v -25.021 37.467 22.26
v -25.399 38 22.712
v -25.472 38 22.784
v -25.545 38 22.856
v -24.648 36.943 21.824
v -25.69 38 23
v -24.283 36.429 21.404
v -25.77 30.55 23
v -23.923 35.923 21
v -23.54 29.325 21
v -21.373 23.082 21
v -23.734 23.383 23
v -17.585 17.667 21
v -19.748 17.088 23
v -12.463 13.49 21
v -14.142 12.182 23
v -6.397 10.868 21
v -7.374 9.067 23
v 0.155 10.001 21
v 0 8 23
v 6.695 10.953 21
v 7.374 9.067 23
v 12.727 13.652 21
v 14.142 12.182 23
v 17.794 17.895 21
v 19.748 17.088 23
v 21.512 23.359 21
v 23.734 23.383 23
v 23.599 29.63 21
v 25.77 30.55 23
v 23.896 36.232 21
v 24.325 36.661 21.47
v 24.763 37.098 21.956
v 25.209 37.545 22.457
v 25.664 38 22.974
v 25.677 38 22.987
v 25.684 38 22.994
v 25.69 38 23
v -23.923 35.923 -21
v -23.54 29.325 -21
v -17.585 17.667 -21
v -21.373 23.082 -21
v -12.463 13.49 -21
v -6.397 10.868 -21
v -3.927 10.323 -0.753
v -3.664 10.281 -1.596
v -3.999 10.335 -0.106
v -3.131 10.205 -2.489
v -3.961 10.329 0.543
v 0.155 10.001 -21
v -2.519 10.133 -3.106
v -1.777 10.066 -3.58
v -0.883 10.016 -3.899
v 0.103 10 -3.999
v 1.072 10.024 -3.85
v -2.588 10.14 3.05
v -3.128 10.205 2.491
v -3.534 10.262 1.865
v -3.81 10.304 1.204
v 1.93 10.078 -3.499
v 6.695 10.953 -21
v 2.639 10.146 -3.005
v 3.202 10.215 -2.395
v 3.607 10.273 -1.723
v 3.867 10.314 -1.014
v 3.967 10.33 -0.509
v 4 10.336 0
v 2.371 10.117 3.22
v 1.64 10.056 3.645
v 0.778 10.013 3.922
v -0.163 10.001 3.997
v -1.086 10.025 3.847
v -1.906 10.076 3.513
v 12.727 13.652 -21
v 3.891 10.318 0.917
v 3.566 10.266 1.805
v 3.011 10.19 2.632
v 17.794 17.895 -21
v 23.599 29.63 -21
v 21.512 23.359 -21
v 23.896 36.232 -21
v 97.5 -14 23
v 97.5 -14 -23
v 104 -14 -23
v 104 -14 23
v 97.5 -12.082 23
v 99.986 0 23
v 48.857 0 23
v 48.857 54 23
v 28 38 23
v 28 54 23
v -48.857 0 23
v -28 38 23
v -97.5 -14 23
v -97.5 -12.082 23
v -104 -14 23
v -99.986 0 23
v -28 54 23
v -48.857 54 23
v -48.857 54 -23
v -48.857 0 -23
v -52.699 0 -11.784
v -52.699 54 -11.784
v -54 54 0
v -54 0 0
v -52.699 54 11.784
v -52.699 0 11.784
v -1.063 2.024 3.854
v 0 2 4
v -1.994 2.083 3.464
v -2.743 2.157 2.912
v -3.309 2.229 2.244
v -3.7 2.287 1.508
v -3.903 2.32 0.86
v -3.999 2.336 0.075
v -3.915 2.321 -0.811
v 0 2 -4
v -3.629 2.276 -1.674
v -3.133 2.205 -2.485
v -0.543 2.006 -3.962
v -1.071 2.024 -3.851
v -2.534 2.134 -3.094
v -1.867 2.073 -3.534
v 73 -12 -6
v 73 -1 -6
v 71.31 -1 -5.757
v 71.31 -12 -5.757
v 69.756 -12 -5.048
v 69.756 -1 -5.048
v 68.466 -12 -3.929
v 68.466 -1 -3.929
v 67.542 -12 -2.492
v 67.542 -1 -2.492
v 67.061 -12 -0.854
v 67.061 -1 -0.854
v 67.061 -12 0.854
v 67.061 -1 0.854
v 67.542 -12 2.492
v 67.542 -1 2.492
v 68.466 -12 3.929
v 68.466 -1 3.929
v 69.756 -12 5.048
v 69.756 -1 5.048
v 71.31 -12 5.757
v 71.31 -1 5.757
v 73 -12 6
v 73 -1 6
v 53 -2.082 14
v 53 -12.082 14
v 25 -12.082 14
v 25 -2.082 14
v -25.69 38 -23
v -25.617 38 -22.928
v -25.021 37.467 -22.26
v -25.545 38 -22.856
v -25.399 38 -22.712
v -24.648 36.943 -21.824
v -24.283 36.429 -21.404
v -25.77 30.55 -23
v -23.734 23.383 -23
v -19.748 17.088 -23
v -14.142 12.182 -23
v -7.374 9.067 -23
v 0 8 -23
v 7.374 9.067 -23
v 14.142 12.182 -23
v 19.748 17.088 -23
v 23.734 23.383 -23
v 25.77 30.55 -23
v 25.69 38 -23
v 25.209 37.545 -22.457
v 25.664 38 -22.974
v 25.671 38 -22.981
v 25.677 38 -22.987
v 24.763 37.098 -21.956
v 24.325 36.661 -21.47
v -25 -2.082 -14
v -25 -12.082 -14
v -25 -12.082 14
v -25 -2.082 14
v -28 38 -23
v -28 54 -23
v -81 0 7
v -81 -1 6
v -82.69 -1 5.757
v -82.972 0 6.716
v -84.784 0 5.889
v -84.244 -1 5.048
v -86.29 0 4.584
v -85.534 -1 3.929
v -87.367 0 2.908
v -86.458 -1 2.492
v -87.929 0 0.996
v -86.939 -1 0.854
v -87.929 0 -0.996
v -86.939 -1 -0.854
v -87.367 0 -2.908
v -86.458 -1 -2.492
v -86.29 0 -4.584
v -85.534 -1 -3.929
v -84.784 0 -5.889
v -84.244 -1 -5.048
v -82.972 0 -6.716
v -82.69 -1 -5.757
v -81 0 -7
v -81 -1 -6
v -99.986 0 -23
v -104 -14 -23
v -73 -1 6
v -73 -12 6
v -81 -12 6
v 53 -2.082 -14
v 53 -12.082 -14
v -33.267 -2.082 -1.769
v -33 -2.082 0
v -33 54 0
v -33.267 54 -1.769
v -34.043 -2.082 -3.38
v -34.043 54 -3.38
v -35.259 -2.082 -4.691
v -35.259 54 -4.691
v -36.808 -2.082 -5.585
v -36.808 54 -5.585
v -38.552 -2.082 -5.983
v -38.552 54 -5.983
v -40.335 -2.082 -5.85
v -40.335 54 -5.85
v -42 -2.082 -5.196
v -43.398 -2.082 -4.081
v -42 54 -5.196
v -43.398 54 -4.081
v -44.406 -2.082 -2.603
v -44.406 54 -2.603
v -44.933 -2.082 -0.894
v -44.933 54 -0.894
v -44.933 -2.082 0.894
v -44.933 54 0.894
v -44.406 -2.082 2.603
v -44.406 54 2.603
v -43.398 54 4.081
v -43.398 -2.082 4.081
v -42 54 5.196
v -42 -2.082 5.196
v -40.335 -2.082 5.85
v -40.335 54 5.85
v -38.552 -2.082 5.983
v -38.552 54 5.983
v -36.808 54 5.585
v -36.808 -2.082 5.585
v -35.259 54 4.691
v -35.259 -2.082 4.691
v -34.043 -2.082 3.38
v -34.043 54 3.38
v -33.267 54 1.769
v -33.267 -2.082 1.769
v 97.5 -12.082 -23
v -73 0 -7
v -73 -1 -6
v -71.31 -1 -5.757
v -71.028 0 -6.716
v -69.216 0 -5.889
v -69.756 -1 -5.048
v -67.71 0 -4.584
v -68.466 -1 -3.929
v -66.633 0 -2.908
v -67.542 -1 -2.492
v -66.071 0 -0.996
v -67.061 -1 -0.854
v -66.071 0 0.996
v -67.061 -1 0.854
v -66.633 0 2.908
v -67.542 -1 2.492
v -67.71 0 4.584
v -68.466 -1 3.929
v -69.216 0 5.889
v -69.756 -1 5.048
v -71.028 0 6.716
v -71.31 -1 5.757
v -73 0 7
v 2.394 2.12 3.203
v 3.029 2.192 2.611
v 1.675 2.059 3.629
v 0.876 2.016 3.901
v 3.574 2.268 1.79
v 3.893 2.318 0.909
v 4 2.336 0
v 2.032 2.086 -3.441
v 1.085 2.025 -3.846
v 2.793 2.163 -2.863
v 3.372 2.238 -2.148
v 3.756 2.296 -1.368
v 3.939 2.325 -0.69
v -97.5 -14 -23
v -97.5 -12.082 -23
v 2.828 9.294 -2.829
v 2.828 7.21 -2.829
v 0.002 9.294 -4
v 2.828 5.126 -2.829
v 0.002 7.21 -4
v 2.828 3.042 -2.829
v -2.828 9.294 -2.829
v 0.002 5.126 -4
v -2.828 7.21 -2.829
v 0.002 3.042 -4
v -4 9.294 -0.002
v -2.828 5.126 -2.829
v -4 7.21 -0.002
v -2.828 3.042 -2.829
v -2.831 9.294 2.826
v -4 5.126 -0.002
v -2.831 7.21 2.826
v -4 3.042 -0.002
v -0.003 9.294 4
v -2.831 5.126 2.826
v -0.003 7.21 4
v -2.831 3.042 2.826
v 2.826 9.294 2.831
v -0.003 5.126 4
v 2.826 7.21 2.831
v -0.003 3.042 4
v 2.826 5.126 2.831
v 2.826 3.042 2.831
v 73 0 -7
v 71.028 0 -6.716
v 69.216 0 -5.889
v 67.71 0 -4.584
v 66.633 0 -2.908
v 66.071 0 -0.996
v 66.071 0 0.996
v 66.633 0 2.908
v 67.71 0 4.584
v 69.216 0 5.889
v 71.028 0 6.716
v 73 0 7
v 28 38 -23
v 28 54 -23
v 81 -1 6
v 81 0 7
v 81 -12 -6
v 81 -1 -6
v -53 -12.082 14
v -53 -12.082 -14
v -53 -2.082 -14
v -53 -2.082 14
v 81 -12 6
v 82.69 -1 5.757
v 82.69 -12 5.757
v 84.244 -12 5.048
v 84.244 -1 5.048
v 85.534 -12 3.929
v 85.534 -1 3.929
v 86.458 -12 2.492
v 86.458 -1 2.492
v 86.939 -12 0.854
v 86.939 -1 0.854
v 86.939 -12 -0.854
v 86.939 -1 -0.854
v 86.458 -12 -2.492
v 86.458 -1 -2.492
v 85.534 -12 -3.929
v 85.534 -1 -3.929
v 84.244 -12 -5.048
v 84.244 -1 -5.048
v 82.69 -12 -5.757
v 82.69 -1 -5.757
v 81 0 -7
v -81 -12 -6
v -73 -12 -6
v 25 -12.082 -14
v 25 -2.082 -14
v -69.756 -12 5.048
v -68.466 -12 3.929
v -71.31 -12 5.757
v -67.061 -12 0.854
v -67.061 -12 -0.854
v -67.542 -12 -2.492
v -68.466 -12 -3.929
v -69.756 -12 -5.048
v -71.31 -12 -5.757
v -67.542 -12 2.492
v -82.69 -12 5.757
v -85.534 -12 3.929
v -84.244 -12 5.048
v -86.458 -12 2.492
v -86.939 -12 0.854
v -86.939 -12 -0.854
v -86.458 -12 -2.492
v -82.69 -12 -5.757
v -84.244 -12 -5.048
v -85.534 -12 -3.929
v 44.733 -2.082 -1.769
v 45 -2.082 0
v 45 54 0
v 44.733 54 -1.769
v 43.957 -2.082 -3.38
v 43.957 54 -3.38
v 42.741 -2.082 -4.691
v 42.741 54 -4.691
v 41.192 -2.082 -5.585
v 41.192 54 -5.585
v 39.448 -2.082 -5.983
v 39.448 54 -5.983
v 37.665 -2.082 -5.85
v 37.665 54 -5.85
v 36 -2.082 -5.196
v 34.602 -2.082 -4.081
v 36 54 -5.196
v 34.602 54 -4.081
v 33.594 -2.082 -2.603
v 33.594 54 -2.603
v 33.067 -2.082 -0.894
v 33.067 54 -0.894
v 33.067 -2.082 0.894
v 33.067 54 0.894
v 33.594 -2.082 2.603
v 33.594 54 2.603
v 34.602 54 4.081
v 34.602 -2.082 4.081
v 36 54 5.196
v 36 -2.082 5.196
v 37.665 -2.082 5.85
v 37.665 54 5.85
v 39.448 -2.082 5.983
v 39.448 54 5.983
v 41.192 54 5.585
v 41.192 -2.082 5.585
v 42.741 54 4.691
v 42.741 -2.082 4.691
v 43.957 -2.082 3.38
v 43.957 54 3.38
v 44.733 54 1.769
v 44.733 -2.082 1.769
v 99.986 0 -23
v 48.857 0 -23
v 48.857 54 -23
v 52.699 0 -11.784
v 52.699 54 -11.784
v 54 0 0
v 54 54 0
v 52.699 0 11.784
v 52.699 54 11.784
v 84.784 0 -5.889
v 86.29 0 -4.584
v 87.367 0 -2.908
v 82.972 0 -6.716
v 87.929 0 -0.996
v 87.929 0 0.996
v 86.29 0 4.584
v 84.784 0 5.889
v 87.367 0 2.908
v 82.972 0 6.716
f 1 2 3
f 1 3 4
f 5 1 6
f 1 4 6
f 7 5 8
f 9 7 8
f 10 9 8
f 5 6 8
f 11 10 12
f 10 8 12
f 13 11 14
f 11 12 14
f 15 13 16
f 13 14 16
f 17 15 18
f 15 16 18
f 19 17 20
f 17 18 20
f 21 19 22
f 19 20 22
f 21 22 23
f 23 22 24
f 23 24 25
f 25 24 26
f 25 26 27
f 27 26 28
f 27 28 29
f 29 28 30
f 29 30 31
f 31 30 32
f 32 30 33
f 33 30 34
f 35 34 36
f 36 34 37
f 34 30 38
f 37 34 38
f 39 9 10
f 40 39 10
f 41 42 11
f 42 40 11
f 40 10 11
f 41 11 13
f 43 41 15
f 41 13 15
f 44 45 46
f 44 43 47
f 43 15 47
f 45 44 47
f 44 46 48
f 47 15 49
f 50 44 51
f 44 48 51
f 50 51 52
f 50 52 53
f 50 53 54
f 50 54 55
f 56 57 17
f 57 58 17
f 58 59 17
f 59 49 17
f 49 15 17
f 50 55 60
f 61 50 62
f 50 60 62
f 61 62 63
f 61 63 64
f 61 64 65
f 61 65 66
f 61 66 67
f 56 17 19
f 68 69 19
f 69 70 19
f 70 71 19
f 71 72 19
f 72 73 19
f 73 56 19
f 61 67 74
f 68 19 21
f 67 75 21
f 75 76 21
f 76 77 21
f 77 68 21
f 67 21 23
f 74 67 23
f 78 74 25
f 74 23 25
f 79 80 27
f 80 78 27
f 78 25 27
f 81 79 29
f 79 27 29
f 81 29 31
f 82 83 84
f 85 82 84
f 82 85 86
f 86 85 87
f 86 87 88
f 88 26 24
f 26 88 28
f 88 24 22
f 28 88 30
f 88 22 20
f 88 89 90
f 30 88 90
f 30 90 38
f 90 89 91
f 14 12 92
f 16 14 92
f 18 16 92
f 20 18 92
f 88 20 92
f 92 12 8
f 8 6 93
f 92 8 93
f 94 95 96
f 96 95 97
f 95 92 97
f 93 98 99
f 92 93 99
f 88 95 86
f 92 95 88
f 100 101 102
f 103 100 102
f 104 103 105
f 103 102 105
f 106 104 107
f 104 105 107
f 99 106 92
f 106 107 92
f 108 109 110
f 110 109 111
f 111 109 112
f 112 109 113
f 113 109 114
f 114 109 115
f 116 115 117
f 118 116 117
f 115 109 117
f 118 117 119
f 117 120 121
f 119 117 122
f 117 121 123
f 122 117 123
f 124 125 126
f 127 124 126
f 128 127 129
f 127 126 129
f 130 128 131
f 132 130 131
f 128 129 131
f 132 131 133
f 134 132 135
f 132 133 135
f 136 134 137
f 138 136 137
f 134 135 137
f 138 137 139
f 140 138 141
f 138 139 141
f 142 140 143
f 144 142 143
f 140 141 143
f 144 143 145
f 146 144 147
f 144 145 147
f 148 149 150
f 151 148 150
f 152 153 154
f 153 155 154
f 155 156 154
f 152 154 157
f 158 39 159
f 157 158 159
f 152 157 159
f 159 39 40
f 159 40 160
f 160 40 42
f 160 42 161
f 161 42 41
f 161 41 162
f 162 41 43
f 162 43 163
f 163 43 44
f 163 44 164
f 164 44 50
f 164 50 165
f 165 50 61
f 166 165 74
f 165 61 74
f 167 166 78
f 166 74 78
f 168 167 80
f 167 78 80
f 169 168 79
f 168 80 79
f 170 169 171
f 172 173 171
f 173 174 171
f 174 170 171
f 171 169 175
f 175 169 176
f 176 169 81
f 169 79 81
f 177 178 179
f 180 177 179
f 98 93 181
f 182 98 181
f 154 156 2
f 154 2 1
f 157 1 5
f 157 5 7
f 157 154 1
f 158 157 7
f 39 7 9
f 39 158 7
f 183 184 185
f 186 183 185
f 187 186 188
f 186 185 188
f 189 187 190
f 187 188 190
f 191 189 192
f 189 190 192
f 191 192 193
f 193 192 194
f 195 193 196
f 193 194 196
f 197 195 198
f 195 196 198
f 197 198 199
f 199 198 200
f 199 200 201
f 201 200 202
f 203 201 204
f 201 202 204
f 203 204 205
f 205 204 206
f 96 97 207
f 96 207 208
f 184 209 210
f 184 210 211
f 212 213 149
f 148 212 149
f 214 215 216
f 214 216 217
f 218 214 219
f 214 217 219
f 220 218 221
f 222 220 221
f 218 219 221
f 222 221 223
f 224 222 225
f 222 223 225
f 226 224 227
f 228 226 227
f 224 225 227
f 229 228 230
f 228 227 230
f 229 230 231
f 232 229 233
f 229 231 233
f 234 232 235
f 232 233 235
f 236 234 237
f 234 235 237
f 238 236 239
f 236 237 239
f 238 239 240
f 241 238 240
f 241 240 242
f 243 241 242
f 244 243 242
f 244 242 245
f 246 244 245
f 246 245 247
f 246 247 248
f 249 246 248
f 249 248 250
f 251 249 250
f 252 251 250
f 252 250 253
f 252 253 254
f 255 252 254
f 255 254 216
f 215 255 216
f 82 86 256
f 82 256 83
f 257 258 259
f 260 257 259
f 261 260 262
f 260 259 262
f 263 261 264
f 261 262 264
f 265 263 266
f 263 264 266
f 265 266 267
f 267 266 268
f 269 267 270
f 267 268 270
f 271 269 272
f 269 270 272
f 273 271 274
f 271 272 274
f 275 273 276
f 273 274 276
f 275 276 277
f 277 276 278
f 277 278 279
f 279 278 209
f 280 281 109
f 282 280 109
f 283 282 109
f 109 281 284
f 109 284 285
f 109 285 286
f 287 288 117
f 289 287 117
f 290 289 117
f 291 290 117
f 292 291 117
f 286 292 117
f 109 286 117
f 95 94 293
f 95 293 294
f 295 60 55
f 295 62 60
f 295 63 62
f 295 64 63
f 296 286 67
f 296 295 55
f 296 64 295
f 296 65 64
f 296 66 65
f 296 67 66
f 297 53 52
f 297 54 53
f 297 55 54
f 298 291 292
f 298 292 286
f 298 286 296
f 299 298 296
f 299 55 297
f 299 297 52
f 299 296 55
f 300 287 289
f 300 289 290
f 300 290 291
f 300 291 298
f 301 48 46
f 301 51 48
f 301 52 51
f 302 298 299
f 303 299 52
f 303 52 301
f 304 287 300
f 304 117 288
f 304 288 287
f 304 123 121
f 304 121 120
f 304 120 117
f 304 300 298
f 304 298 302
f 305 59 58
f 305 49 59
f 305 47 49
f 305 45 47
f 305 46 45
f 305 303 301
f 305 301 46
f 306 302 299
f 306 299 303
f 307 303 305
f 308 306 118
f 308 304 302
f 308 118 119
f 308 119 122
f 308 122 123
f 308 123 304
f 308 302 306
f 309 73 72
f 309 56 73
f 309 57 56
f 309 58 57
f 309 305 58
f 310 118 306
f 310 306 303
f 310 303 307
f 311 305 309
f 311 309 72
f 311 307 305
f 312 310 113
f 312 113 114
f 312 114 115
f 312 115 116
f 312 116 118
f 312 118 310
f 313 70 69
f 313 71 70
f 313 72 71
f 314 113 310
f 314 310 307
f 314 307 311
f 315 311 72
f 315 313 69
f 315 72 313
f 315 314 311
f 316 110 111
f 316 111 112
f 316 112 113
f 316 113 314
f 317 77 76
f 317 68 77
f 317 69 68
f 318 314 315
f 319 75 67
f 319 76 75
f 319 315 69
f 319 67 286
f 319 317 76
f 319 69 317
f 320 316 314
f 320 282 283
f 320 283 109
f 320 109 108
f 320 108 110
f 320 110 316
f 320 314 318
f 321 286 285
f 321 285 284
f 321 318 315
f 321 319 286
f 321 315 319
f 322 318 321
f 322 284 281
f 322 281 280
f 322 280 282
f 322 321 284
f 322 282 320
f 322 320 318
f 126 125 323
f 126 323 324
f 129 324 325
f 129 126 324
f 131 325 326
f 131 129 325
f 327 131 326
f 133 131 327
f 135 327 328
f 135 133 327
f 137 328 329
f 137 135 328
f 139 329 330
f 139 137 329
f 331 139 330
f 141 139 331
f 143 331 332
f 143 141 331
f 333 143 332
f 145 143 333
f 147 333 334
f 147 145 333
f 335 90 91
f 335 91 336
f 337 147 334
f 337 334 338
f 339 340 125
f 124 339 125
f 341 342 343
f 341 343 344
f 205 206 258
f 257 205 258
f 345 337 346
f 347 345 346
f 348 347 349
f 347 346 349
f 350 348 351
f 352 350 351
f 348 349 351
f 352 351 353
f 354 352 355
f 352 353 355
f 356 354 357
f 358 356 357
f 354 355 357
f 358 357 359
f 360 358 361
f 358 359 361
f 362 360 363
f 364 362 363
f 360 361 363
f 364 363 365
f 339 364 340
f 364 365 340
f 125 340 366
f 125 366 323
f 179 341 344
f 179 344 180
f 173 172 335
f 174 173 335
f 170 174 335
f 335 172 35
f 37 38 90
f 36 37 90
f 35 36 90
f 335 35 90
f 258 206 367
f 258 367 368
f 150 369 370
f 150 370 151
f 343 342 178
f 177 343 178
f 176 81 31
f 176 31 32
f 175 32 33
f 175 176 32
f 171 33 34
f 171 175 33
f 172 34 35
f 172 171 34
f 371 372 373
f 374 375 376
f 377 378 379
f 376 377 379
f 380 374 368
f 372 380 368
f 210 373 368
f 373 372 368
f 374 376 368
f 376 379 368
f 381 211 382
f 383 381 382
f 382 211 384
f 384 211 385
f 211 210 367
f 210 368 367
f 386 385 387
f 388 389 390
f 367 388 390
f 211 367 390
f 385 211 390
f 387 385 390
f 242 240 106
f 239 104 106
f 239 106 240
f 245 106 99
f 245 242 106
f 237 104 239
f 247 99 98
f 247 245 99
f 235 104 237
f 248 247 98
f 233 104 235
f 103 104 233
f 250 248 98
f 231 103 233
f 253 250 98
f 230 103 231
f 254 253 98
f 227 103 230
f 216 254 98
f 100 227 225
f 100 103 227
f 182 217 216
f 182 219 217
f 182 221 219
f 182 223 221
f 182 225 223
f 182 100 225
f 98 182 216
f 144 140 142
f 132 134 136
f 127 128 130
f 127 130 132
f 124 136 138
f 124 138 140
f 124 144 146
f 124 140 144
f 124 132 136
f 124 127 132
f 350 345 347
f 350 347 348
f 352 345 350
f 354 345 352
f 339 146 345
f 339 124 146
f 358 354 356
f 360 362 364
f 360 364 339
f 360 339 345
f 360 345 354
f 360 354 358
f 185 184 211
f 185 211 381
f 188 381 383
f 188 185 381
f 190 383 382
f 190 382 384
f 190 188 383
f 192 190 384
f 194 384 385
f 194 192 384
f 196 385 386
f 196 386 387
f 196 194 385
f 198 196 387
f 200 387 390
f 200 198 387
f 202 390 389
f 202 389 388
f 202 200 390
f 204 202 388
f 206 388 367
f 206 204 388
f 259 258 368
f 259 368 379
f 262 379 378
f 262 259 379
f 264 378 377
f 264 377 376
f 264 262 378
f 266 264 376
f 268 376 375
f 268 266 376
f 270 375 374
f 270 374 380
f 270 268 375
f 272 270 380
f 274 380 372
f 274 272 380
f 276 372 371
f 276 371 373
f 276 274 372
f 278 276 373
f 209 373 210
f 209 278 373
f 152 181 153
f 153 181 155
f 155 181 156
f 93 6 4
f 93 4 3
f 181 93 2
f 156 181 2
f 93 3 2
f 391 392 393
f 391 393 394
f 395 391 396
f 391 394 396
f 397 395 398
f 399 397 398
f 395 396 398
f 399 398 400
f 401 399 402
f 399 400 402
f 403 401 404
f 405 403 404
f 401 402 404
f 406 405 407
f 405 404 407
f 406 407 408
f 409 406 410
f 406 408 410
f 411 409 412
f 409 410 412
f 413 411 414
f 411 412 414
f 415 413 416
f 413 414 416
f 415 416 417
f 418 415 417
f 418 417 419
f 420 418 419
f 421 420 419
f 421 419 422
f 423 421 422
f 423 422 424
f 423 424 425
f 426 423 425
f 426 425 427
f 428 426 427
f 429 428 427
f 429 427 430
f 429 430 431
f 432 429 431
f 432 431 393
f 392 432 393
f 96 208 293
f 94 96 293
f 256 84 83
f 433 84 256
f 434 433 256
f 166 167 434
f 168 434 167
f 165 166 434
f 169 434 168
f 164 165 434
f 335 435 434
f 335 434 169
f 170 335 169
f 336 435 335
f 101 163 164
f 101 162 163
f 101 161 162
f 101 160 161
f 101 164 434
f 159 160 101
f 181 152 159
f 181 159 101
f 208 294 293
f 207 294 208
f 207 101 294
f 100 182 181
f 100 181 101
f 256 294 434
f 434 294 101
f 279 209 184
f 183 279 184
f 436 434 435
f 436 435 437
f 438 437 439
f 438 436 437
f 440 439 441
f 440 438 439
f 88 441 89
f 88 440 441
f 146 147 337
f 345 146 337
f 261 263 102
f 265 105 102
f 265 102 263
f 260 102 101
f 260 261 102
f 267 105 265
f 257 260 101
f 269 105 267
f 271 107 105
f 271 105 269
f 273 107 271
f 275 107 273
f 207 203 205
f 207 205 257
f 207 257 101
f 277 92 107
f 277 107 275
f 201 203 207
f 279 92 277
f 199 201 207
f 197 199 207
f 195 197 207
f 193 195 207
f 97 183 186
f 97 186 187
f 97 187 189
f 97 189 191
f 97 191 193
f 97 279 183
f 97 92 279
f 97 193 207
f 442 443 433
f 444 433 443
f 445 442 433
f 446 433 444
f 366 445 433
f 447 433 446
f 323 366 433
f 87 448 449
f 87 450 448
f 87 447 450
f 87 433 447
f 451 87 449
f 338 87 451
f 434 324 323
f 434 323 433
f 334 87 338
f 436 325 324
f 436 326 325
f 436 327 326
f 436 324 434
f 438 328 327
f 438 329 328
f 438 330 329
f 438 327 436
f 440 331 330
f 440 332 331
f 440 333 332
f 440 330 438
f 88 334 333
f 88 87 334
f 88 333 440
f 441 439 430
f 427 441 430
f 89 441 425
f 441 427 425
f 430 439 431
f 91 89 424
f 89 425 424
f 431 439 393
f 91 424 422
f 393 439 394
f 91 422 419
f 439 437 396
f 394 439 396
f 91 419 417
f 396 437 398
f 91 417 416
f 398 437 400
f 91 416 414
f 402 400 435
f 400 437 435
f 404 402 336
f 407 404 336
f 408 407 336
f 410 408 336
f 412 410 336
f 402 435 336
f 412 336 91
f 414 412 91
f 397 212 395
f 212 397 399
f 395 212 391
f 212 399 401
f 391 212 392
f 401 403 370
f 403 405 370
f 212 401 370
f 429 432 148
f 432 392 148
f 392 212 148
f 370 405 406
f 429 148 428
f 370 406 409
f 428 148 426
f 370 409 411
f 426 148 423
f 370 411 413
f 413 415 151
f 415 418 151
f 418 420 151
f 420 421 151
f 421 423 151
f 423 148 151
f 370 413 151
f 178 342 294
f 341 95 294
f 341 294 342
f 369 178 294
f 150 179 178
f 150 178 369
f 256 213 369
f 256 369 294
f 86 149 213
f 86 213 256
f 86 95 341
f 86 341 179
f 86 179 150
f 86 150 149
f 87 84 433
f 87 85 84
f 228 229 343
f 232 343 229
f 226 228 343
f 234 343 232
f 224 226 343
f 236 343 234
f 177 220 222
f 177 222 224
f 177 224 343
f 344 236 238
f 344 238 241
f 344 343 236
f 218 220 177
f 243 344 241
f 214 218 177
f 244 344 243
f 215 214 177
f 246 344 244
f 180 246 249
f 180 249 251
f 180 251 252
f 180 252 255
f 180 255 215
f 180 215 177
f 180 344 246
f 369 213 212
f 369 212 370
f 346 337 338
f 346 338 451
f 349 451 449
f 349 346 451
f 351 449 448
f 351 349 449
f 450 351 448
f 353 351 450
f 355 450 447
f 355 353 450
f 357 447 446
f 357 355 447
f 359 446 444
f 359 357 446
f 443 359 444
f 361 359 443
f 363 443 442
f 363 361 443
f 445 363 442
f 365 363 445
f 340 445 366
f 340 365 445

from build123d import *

# Parameters (mm, degrees)
BOSS_EXTRUDE1_DEPTH      = 23
BOSS_EXTRUDE2_DEPTH      = 54
BOSS_EXTRUDE3_DEPTH      = 23
CUT_EXTRUDE1_DEPTH       = 12
CHAMFER1_SIZE            = 1
CHAMFER1_OF_MIRROR2_SIZE = 1
SKETCH7_W                = 28
SKETCH7_H                = 28
CUT_EXTRUDE2_DEPTH       = 10
F_12_0MM_DOWEL_HOLE1_D   = 12
CUT_EXTRUDE3_START       = 1.999999915
CUT_EXTRUDE3_DEPTH       = 36.000000085
CUT_EXTRUDE3_START_2     = -5
CUT_EXTRUDE3_2_DEPTH     = 10
CHAMFER2_START           = -23
CHAMFER2_2_DEPTH         = 46


with BuildPart() as part:
    # Sketch2 → Boss-Extrude1 (new, symmetric)
    with BuildSketch(Plane.XY):
        Polygon((99.985564599, 0), (-99.985564599, 0), (-104, -14), (-97.5, -14), (-97.5, -12.082323829), (97.5, -12.082323829), (97.5, -14), (104, -14), align=None)
    extrude(amount=BOSS_EXTRUDE1_DEPTH, both=True)

    # Sketch3 → Boss-Extrude2 (add)
    with BuildSketch(Plane(origin=(0, 0, 0), x_dir=(1, 0, 0), z_dir=(0, 1, 0))):
        with BuildLine():
            Line((48.856934001, -23), (28, -23))
            Line((28, -23), (28, 23))
            Line((28, 23), (48.856934001, 23))
            ThreePointArc((48.856934001, 23), (54, 0), (48.856934001, -23))
        make_face()
    boss_extrude2 = extrude(amount=BOSS_EXTRUDE2_DEPTH)

    # Mirror1: Boss-Extrude2 across plane
    add(boss_extrude2.mirror(Plane(origin=(0, 0, 0), x_dir=(0, 0, 1), z_dir=(1, 0, 0))))

    # Sketch4 → Boss-Extrude3 (add, symmetric)
    with BuildSketch(Plane.XY):
        with BuildLine():
            Line((-28, 38), (-23.664319132, 38))
            ThreePointArc((-23.664319132, 38), (0, 10), (23.664319132, 38))
            Line((23.664319132, 38), (28, 38))
            Line((28, 38), (28, 0))
            Line((28, 0), (-28, 0))
            Line((-28, 0), (-28, 38))
        make_face()
    extrude(amount=BOSS_EXTRUDE3_DEPTH, both=True)

    # Sketch5 → Cut-Extrude1 (cut)
    with BuildSketch(Plane(origin=(0, 0, 0), x_dir=(1, 0, 0), z_dir=(0, 1, 0))):
        with BuildLine():
            Line((-81, 6), (-73, 6))
            ThreePointArc((-73, 6), (-67, 0), (-73, -6))
            Line((-73, -6), (-81, -6))
            ThreePointArc((-81, -6), (-87, 0), (-81, 6))
        make_face()
    cut_extrude1 = extrude(amount=-CUT_EXTRUDE1_DEPTH, mode=Mode.SUBTRACT)

    # Chamfer1
    chamfer1_edges = [part.edges().sort_by_distance(p)[0] for p in [
        (-87, 0, 0),
        (-77, 0, 6),
        (-67, 0, 0),
        (-77, 0, -6),
    ]]
    chamfer(chamfer1_edges, length=CHAMFER1_SIZE)

    # Mirror2: Cut-Extrude1 across plane
    add(cut_extrude1.mirror(Plane(origin=(0, 0, 0), x_dir=(0, 0, 1), z_dir=(1, 0, 0))), mode=Mode.SUBTRACT)

    # Chamfer1 of Mirror2
    chamfer1_of_mirror2_edges = [part.edges().sort_by_distance(p)[0] for p in [
        (87, 0, 0),
        (77, 0, 6),
        (67, 0, 0),
        (77, 0, -6),
    ]]
    chamfer(chamfer1_of_mirror2_edges, length=CHAMFER1_OF_MIRROR2_SIZE)

    # Sketch7 → Cut-Extrude2 (cut)
    with BuildSketch(Plane.XZ.offset(12.082323829)):
        with Locations((-39, 0)):
            Rectangle(SKETCH7_W, SKETCH7_H)
    cut_extrude2 = extrude(amount=-CUT_EXTRUDE2_DEPTH, mode=Mode.SUBTRACT)

    # Mirror3: Cut-Extrude2 across plane
    add(cut_extrude2.mirror(Plane(origin=(0, 0, 0), x_dir=(0, 0, 1), z_dir=(1, 0, 0))), mode=Mode.SUBTRACT)

    # Ø12.0mm Dowel Hole1 (through all)
    with Locations(Plane(origin=(0, -2.082323829, 0), x_dir=(-1, 0, 0), z_dir=(0, -1, 0))):
        with Locations((39, 0), (-39, 0)):
            Hole(F_12_0MM_DOWEL_HOLE1_D / 2)

    # Cut-Extrude3: read off the stored shape, not the designer's step
    # Cut-Extrude3 outline → Cut-Extrude3 (cut)
    with BuildSketch(Plane(origin=(0, 0, 0), x_dir=(1, 0, 0), z_dir=(0, 1, 0)).offset(CUT_EXTRUDE3_START)):
        with BuildLine():
            add(Edge.make_bspline(
                [(4, 0), (4, 1.059018663), (3.564754015, 2.092267125), (2.091459192, 3.565228094), (1.047779124, 3.999399314), (-1.043187737, 4.000599369), (-2.08248981, 3.57393755), (-3.572744195, 2.08453648), (-3.999590121, 1.046654427), (-4.000409264, -1.043519212), (-3.567812098, -2.087662609), (-2.094321457, -3.563907402), (-1.060428453, -3.999150693), (1.054011474, -4.000846733), (2.089559005, -3.5661873), (3.563043078, -2.094915922), (4, -1.059018663), (4, 0)],
                knots=[0, 0, 0, 0, 0.125, 0.125, 0.25, 0.25, 0.375, 0.375, 0.5, 0.5, 0.625, 0.625, 0.75, 0.75, 0.875, 0.875, 1, 1, 1, 1], degree=3))
        make_face()
    extrude(amount=CUT_EXTRUDE3_DEPTH, mode=Mode.SUBTRACT)

    # Cut-Extrude3 2 outline → Cut-Extrude3 2 (add)
    with BuildSketch(Plane.XY.offset(CUT_EXTRUDE3_START_2)):
        with BuildLine():
            Line((5, 2.504711719), (4, 2.335680868))
            ThreePointArc((4, 2.335680868), (2.007030354, 2.084067462), (2.16e-07, 2))
            Line((2.16e-07, 2), (5, 1.999999915))
            Line((5, 1.999999915), (5, 2.504711719))
        make_face()
        with BuildLine():
            Line((-5, 1.999999915), (2.16e-07, 2))
            ThreePointArc((2.16e-07, 2), (-2.014229388, 2.084672698), (-4.014246469, 2.338093372))
            Line((-4.014246469, 2.338093372), (-5, 2.505326626))
            Line((-5, 2.505326626), (-5, 1.999999915))
        make_face()
    extrude(amount=CUT_EXTRUDE3_2_DEPTH)

    # Chamfer2: read off the stored shape, not the designer's step
    # Chamfer2 outline → Chamfer2 (revolve, cut)
    with BuildSketch(Plane.XZ.offset(-34)):
        Polygon((24, 23), (24, 21), (26, 23), align=None)
        Polygon((26, -23), (24, -21), (24, -23), align=None)
    revolve(axis=Axis((0, 34, 0), (0, 0, 1)), mode=Mode.SUBTRACT)

    # Chamfer2 2 outline → Chamfer2 2 (cut)
    with BuildSketch(Plane.XY.offset(CHAMFER2_START)):
        with BuildLine():
            ThreePointArc((23.664319132, 38), (23.796597884, 37.118000823), (23.896015012, 36.231695881))
            Line((23.896015012, 36.231695881), (25.664319132, 38))
            Line((25.664319132, 38), (23.664319132, 38))
        make_face()
        with BuildLine():
            Line((-25.399406115, 38), (-23.922856044, 35.922747689))
            ThreePointArc((-23.922856044, 35.922747689), (-23.816245603, 36.964193884), (-23.664319132, 38))
            Line((-23.664319132, 38), (-25.399406115, 38))
        make_face()
    extrude(amount=CHAMFER2_2_DEPTH, mode=Mode.SUBTRACT)


solid = part.part
